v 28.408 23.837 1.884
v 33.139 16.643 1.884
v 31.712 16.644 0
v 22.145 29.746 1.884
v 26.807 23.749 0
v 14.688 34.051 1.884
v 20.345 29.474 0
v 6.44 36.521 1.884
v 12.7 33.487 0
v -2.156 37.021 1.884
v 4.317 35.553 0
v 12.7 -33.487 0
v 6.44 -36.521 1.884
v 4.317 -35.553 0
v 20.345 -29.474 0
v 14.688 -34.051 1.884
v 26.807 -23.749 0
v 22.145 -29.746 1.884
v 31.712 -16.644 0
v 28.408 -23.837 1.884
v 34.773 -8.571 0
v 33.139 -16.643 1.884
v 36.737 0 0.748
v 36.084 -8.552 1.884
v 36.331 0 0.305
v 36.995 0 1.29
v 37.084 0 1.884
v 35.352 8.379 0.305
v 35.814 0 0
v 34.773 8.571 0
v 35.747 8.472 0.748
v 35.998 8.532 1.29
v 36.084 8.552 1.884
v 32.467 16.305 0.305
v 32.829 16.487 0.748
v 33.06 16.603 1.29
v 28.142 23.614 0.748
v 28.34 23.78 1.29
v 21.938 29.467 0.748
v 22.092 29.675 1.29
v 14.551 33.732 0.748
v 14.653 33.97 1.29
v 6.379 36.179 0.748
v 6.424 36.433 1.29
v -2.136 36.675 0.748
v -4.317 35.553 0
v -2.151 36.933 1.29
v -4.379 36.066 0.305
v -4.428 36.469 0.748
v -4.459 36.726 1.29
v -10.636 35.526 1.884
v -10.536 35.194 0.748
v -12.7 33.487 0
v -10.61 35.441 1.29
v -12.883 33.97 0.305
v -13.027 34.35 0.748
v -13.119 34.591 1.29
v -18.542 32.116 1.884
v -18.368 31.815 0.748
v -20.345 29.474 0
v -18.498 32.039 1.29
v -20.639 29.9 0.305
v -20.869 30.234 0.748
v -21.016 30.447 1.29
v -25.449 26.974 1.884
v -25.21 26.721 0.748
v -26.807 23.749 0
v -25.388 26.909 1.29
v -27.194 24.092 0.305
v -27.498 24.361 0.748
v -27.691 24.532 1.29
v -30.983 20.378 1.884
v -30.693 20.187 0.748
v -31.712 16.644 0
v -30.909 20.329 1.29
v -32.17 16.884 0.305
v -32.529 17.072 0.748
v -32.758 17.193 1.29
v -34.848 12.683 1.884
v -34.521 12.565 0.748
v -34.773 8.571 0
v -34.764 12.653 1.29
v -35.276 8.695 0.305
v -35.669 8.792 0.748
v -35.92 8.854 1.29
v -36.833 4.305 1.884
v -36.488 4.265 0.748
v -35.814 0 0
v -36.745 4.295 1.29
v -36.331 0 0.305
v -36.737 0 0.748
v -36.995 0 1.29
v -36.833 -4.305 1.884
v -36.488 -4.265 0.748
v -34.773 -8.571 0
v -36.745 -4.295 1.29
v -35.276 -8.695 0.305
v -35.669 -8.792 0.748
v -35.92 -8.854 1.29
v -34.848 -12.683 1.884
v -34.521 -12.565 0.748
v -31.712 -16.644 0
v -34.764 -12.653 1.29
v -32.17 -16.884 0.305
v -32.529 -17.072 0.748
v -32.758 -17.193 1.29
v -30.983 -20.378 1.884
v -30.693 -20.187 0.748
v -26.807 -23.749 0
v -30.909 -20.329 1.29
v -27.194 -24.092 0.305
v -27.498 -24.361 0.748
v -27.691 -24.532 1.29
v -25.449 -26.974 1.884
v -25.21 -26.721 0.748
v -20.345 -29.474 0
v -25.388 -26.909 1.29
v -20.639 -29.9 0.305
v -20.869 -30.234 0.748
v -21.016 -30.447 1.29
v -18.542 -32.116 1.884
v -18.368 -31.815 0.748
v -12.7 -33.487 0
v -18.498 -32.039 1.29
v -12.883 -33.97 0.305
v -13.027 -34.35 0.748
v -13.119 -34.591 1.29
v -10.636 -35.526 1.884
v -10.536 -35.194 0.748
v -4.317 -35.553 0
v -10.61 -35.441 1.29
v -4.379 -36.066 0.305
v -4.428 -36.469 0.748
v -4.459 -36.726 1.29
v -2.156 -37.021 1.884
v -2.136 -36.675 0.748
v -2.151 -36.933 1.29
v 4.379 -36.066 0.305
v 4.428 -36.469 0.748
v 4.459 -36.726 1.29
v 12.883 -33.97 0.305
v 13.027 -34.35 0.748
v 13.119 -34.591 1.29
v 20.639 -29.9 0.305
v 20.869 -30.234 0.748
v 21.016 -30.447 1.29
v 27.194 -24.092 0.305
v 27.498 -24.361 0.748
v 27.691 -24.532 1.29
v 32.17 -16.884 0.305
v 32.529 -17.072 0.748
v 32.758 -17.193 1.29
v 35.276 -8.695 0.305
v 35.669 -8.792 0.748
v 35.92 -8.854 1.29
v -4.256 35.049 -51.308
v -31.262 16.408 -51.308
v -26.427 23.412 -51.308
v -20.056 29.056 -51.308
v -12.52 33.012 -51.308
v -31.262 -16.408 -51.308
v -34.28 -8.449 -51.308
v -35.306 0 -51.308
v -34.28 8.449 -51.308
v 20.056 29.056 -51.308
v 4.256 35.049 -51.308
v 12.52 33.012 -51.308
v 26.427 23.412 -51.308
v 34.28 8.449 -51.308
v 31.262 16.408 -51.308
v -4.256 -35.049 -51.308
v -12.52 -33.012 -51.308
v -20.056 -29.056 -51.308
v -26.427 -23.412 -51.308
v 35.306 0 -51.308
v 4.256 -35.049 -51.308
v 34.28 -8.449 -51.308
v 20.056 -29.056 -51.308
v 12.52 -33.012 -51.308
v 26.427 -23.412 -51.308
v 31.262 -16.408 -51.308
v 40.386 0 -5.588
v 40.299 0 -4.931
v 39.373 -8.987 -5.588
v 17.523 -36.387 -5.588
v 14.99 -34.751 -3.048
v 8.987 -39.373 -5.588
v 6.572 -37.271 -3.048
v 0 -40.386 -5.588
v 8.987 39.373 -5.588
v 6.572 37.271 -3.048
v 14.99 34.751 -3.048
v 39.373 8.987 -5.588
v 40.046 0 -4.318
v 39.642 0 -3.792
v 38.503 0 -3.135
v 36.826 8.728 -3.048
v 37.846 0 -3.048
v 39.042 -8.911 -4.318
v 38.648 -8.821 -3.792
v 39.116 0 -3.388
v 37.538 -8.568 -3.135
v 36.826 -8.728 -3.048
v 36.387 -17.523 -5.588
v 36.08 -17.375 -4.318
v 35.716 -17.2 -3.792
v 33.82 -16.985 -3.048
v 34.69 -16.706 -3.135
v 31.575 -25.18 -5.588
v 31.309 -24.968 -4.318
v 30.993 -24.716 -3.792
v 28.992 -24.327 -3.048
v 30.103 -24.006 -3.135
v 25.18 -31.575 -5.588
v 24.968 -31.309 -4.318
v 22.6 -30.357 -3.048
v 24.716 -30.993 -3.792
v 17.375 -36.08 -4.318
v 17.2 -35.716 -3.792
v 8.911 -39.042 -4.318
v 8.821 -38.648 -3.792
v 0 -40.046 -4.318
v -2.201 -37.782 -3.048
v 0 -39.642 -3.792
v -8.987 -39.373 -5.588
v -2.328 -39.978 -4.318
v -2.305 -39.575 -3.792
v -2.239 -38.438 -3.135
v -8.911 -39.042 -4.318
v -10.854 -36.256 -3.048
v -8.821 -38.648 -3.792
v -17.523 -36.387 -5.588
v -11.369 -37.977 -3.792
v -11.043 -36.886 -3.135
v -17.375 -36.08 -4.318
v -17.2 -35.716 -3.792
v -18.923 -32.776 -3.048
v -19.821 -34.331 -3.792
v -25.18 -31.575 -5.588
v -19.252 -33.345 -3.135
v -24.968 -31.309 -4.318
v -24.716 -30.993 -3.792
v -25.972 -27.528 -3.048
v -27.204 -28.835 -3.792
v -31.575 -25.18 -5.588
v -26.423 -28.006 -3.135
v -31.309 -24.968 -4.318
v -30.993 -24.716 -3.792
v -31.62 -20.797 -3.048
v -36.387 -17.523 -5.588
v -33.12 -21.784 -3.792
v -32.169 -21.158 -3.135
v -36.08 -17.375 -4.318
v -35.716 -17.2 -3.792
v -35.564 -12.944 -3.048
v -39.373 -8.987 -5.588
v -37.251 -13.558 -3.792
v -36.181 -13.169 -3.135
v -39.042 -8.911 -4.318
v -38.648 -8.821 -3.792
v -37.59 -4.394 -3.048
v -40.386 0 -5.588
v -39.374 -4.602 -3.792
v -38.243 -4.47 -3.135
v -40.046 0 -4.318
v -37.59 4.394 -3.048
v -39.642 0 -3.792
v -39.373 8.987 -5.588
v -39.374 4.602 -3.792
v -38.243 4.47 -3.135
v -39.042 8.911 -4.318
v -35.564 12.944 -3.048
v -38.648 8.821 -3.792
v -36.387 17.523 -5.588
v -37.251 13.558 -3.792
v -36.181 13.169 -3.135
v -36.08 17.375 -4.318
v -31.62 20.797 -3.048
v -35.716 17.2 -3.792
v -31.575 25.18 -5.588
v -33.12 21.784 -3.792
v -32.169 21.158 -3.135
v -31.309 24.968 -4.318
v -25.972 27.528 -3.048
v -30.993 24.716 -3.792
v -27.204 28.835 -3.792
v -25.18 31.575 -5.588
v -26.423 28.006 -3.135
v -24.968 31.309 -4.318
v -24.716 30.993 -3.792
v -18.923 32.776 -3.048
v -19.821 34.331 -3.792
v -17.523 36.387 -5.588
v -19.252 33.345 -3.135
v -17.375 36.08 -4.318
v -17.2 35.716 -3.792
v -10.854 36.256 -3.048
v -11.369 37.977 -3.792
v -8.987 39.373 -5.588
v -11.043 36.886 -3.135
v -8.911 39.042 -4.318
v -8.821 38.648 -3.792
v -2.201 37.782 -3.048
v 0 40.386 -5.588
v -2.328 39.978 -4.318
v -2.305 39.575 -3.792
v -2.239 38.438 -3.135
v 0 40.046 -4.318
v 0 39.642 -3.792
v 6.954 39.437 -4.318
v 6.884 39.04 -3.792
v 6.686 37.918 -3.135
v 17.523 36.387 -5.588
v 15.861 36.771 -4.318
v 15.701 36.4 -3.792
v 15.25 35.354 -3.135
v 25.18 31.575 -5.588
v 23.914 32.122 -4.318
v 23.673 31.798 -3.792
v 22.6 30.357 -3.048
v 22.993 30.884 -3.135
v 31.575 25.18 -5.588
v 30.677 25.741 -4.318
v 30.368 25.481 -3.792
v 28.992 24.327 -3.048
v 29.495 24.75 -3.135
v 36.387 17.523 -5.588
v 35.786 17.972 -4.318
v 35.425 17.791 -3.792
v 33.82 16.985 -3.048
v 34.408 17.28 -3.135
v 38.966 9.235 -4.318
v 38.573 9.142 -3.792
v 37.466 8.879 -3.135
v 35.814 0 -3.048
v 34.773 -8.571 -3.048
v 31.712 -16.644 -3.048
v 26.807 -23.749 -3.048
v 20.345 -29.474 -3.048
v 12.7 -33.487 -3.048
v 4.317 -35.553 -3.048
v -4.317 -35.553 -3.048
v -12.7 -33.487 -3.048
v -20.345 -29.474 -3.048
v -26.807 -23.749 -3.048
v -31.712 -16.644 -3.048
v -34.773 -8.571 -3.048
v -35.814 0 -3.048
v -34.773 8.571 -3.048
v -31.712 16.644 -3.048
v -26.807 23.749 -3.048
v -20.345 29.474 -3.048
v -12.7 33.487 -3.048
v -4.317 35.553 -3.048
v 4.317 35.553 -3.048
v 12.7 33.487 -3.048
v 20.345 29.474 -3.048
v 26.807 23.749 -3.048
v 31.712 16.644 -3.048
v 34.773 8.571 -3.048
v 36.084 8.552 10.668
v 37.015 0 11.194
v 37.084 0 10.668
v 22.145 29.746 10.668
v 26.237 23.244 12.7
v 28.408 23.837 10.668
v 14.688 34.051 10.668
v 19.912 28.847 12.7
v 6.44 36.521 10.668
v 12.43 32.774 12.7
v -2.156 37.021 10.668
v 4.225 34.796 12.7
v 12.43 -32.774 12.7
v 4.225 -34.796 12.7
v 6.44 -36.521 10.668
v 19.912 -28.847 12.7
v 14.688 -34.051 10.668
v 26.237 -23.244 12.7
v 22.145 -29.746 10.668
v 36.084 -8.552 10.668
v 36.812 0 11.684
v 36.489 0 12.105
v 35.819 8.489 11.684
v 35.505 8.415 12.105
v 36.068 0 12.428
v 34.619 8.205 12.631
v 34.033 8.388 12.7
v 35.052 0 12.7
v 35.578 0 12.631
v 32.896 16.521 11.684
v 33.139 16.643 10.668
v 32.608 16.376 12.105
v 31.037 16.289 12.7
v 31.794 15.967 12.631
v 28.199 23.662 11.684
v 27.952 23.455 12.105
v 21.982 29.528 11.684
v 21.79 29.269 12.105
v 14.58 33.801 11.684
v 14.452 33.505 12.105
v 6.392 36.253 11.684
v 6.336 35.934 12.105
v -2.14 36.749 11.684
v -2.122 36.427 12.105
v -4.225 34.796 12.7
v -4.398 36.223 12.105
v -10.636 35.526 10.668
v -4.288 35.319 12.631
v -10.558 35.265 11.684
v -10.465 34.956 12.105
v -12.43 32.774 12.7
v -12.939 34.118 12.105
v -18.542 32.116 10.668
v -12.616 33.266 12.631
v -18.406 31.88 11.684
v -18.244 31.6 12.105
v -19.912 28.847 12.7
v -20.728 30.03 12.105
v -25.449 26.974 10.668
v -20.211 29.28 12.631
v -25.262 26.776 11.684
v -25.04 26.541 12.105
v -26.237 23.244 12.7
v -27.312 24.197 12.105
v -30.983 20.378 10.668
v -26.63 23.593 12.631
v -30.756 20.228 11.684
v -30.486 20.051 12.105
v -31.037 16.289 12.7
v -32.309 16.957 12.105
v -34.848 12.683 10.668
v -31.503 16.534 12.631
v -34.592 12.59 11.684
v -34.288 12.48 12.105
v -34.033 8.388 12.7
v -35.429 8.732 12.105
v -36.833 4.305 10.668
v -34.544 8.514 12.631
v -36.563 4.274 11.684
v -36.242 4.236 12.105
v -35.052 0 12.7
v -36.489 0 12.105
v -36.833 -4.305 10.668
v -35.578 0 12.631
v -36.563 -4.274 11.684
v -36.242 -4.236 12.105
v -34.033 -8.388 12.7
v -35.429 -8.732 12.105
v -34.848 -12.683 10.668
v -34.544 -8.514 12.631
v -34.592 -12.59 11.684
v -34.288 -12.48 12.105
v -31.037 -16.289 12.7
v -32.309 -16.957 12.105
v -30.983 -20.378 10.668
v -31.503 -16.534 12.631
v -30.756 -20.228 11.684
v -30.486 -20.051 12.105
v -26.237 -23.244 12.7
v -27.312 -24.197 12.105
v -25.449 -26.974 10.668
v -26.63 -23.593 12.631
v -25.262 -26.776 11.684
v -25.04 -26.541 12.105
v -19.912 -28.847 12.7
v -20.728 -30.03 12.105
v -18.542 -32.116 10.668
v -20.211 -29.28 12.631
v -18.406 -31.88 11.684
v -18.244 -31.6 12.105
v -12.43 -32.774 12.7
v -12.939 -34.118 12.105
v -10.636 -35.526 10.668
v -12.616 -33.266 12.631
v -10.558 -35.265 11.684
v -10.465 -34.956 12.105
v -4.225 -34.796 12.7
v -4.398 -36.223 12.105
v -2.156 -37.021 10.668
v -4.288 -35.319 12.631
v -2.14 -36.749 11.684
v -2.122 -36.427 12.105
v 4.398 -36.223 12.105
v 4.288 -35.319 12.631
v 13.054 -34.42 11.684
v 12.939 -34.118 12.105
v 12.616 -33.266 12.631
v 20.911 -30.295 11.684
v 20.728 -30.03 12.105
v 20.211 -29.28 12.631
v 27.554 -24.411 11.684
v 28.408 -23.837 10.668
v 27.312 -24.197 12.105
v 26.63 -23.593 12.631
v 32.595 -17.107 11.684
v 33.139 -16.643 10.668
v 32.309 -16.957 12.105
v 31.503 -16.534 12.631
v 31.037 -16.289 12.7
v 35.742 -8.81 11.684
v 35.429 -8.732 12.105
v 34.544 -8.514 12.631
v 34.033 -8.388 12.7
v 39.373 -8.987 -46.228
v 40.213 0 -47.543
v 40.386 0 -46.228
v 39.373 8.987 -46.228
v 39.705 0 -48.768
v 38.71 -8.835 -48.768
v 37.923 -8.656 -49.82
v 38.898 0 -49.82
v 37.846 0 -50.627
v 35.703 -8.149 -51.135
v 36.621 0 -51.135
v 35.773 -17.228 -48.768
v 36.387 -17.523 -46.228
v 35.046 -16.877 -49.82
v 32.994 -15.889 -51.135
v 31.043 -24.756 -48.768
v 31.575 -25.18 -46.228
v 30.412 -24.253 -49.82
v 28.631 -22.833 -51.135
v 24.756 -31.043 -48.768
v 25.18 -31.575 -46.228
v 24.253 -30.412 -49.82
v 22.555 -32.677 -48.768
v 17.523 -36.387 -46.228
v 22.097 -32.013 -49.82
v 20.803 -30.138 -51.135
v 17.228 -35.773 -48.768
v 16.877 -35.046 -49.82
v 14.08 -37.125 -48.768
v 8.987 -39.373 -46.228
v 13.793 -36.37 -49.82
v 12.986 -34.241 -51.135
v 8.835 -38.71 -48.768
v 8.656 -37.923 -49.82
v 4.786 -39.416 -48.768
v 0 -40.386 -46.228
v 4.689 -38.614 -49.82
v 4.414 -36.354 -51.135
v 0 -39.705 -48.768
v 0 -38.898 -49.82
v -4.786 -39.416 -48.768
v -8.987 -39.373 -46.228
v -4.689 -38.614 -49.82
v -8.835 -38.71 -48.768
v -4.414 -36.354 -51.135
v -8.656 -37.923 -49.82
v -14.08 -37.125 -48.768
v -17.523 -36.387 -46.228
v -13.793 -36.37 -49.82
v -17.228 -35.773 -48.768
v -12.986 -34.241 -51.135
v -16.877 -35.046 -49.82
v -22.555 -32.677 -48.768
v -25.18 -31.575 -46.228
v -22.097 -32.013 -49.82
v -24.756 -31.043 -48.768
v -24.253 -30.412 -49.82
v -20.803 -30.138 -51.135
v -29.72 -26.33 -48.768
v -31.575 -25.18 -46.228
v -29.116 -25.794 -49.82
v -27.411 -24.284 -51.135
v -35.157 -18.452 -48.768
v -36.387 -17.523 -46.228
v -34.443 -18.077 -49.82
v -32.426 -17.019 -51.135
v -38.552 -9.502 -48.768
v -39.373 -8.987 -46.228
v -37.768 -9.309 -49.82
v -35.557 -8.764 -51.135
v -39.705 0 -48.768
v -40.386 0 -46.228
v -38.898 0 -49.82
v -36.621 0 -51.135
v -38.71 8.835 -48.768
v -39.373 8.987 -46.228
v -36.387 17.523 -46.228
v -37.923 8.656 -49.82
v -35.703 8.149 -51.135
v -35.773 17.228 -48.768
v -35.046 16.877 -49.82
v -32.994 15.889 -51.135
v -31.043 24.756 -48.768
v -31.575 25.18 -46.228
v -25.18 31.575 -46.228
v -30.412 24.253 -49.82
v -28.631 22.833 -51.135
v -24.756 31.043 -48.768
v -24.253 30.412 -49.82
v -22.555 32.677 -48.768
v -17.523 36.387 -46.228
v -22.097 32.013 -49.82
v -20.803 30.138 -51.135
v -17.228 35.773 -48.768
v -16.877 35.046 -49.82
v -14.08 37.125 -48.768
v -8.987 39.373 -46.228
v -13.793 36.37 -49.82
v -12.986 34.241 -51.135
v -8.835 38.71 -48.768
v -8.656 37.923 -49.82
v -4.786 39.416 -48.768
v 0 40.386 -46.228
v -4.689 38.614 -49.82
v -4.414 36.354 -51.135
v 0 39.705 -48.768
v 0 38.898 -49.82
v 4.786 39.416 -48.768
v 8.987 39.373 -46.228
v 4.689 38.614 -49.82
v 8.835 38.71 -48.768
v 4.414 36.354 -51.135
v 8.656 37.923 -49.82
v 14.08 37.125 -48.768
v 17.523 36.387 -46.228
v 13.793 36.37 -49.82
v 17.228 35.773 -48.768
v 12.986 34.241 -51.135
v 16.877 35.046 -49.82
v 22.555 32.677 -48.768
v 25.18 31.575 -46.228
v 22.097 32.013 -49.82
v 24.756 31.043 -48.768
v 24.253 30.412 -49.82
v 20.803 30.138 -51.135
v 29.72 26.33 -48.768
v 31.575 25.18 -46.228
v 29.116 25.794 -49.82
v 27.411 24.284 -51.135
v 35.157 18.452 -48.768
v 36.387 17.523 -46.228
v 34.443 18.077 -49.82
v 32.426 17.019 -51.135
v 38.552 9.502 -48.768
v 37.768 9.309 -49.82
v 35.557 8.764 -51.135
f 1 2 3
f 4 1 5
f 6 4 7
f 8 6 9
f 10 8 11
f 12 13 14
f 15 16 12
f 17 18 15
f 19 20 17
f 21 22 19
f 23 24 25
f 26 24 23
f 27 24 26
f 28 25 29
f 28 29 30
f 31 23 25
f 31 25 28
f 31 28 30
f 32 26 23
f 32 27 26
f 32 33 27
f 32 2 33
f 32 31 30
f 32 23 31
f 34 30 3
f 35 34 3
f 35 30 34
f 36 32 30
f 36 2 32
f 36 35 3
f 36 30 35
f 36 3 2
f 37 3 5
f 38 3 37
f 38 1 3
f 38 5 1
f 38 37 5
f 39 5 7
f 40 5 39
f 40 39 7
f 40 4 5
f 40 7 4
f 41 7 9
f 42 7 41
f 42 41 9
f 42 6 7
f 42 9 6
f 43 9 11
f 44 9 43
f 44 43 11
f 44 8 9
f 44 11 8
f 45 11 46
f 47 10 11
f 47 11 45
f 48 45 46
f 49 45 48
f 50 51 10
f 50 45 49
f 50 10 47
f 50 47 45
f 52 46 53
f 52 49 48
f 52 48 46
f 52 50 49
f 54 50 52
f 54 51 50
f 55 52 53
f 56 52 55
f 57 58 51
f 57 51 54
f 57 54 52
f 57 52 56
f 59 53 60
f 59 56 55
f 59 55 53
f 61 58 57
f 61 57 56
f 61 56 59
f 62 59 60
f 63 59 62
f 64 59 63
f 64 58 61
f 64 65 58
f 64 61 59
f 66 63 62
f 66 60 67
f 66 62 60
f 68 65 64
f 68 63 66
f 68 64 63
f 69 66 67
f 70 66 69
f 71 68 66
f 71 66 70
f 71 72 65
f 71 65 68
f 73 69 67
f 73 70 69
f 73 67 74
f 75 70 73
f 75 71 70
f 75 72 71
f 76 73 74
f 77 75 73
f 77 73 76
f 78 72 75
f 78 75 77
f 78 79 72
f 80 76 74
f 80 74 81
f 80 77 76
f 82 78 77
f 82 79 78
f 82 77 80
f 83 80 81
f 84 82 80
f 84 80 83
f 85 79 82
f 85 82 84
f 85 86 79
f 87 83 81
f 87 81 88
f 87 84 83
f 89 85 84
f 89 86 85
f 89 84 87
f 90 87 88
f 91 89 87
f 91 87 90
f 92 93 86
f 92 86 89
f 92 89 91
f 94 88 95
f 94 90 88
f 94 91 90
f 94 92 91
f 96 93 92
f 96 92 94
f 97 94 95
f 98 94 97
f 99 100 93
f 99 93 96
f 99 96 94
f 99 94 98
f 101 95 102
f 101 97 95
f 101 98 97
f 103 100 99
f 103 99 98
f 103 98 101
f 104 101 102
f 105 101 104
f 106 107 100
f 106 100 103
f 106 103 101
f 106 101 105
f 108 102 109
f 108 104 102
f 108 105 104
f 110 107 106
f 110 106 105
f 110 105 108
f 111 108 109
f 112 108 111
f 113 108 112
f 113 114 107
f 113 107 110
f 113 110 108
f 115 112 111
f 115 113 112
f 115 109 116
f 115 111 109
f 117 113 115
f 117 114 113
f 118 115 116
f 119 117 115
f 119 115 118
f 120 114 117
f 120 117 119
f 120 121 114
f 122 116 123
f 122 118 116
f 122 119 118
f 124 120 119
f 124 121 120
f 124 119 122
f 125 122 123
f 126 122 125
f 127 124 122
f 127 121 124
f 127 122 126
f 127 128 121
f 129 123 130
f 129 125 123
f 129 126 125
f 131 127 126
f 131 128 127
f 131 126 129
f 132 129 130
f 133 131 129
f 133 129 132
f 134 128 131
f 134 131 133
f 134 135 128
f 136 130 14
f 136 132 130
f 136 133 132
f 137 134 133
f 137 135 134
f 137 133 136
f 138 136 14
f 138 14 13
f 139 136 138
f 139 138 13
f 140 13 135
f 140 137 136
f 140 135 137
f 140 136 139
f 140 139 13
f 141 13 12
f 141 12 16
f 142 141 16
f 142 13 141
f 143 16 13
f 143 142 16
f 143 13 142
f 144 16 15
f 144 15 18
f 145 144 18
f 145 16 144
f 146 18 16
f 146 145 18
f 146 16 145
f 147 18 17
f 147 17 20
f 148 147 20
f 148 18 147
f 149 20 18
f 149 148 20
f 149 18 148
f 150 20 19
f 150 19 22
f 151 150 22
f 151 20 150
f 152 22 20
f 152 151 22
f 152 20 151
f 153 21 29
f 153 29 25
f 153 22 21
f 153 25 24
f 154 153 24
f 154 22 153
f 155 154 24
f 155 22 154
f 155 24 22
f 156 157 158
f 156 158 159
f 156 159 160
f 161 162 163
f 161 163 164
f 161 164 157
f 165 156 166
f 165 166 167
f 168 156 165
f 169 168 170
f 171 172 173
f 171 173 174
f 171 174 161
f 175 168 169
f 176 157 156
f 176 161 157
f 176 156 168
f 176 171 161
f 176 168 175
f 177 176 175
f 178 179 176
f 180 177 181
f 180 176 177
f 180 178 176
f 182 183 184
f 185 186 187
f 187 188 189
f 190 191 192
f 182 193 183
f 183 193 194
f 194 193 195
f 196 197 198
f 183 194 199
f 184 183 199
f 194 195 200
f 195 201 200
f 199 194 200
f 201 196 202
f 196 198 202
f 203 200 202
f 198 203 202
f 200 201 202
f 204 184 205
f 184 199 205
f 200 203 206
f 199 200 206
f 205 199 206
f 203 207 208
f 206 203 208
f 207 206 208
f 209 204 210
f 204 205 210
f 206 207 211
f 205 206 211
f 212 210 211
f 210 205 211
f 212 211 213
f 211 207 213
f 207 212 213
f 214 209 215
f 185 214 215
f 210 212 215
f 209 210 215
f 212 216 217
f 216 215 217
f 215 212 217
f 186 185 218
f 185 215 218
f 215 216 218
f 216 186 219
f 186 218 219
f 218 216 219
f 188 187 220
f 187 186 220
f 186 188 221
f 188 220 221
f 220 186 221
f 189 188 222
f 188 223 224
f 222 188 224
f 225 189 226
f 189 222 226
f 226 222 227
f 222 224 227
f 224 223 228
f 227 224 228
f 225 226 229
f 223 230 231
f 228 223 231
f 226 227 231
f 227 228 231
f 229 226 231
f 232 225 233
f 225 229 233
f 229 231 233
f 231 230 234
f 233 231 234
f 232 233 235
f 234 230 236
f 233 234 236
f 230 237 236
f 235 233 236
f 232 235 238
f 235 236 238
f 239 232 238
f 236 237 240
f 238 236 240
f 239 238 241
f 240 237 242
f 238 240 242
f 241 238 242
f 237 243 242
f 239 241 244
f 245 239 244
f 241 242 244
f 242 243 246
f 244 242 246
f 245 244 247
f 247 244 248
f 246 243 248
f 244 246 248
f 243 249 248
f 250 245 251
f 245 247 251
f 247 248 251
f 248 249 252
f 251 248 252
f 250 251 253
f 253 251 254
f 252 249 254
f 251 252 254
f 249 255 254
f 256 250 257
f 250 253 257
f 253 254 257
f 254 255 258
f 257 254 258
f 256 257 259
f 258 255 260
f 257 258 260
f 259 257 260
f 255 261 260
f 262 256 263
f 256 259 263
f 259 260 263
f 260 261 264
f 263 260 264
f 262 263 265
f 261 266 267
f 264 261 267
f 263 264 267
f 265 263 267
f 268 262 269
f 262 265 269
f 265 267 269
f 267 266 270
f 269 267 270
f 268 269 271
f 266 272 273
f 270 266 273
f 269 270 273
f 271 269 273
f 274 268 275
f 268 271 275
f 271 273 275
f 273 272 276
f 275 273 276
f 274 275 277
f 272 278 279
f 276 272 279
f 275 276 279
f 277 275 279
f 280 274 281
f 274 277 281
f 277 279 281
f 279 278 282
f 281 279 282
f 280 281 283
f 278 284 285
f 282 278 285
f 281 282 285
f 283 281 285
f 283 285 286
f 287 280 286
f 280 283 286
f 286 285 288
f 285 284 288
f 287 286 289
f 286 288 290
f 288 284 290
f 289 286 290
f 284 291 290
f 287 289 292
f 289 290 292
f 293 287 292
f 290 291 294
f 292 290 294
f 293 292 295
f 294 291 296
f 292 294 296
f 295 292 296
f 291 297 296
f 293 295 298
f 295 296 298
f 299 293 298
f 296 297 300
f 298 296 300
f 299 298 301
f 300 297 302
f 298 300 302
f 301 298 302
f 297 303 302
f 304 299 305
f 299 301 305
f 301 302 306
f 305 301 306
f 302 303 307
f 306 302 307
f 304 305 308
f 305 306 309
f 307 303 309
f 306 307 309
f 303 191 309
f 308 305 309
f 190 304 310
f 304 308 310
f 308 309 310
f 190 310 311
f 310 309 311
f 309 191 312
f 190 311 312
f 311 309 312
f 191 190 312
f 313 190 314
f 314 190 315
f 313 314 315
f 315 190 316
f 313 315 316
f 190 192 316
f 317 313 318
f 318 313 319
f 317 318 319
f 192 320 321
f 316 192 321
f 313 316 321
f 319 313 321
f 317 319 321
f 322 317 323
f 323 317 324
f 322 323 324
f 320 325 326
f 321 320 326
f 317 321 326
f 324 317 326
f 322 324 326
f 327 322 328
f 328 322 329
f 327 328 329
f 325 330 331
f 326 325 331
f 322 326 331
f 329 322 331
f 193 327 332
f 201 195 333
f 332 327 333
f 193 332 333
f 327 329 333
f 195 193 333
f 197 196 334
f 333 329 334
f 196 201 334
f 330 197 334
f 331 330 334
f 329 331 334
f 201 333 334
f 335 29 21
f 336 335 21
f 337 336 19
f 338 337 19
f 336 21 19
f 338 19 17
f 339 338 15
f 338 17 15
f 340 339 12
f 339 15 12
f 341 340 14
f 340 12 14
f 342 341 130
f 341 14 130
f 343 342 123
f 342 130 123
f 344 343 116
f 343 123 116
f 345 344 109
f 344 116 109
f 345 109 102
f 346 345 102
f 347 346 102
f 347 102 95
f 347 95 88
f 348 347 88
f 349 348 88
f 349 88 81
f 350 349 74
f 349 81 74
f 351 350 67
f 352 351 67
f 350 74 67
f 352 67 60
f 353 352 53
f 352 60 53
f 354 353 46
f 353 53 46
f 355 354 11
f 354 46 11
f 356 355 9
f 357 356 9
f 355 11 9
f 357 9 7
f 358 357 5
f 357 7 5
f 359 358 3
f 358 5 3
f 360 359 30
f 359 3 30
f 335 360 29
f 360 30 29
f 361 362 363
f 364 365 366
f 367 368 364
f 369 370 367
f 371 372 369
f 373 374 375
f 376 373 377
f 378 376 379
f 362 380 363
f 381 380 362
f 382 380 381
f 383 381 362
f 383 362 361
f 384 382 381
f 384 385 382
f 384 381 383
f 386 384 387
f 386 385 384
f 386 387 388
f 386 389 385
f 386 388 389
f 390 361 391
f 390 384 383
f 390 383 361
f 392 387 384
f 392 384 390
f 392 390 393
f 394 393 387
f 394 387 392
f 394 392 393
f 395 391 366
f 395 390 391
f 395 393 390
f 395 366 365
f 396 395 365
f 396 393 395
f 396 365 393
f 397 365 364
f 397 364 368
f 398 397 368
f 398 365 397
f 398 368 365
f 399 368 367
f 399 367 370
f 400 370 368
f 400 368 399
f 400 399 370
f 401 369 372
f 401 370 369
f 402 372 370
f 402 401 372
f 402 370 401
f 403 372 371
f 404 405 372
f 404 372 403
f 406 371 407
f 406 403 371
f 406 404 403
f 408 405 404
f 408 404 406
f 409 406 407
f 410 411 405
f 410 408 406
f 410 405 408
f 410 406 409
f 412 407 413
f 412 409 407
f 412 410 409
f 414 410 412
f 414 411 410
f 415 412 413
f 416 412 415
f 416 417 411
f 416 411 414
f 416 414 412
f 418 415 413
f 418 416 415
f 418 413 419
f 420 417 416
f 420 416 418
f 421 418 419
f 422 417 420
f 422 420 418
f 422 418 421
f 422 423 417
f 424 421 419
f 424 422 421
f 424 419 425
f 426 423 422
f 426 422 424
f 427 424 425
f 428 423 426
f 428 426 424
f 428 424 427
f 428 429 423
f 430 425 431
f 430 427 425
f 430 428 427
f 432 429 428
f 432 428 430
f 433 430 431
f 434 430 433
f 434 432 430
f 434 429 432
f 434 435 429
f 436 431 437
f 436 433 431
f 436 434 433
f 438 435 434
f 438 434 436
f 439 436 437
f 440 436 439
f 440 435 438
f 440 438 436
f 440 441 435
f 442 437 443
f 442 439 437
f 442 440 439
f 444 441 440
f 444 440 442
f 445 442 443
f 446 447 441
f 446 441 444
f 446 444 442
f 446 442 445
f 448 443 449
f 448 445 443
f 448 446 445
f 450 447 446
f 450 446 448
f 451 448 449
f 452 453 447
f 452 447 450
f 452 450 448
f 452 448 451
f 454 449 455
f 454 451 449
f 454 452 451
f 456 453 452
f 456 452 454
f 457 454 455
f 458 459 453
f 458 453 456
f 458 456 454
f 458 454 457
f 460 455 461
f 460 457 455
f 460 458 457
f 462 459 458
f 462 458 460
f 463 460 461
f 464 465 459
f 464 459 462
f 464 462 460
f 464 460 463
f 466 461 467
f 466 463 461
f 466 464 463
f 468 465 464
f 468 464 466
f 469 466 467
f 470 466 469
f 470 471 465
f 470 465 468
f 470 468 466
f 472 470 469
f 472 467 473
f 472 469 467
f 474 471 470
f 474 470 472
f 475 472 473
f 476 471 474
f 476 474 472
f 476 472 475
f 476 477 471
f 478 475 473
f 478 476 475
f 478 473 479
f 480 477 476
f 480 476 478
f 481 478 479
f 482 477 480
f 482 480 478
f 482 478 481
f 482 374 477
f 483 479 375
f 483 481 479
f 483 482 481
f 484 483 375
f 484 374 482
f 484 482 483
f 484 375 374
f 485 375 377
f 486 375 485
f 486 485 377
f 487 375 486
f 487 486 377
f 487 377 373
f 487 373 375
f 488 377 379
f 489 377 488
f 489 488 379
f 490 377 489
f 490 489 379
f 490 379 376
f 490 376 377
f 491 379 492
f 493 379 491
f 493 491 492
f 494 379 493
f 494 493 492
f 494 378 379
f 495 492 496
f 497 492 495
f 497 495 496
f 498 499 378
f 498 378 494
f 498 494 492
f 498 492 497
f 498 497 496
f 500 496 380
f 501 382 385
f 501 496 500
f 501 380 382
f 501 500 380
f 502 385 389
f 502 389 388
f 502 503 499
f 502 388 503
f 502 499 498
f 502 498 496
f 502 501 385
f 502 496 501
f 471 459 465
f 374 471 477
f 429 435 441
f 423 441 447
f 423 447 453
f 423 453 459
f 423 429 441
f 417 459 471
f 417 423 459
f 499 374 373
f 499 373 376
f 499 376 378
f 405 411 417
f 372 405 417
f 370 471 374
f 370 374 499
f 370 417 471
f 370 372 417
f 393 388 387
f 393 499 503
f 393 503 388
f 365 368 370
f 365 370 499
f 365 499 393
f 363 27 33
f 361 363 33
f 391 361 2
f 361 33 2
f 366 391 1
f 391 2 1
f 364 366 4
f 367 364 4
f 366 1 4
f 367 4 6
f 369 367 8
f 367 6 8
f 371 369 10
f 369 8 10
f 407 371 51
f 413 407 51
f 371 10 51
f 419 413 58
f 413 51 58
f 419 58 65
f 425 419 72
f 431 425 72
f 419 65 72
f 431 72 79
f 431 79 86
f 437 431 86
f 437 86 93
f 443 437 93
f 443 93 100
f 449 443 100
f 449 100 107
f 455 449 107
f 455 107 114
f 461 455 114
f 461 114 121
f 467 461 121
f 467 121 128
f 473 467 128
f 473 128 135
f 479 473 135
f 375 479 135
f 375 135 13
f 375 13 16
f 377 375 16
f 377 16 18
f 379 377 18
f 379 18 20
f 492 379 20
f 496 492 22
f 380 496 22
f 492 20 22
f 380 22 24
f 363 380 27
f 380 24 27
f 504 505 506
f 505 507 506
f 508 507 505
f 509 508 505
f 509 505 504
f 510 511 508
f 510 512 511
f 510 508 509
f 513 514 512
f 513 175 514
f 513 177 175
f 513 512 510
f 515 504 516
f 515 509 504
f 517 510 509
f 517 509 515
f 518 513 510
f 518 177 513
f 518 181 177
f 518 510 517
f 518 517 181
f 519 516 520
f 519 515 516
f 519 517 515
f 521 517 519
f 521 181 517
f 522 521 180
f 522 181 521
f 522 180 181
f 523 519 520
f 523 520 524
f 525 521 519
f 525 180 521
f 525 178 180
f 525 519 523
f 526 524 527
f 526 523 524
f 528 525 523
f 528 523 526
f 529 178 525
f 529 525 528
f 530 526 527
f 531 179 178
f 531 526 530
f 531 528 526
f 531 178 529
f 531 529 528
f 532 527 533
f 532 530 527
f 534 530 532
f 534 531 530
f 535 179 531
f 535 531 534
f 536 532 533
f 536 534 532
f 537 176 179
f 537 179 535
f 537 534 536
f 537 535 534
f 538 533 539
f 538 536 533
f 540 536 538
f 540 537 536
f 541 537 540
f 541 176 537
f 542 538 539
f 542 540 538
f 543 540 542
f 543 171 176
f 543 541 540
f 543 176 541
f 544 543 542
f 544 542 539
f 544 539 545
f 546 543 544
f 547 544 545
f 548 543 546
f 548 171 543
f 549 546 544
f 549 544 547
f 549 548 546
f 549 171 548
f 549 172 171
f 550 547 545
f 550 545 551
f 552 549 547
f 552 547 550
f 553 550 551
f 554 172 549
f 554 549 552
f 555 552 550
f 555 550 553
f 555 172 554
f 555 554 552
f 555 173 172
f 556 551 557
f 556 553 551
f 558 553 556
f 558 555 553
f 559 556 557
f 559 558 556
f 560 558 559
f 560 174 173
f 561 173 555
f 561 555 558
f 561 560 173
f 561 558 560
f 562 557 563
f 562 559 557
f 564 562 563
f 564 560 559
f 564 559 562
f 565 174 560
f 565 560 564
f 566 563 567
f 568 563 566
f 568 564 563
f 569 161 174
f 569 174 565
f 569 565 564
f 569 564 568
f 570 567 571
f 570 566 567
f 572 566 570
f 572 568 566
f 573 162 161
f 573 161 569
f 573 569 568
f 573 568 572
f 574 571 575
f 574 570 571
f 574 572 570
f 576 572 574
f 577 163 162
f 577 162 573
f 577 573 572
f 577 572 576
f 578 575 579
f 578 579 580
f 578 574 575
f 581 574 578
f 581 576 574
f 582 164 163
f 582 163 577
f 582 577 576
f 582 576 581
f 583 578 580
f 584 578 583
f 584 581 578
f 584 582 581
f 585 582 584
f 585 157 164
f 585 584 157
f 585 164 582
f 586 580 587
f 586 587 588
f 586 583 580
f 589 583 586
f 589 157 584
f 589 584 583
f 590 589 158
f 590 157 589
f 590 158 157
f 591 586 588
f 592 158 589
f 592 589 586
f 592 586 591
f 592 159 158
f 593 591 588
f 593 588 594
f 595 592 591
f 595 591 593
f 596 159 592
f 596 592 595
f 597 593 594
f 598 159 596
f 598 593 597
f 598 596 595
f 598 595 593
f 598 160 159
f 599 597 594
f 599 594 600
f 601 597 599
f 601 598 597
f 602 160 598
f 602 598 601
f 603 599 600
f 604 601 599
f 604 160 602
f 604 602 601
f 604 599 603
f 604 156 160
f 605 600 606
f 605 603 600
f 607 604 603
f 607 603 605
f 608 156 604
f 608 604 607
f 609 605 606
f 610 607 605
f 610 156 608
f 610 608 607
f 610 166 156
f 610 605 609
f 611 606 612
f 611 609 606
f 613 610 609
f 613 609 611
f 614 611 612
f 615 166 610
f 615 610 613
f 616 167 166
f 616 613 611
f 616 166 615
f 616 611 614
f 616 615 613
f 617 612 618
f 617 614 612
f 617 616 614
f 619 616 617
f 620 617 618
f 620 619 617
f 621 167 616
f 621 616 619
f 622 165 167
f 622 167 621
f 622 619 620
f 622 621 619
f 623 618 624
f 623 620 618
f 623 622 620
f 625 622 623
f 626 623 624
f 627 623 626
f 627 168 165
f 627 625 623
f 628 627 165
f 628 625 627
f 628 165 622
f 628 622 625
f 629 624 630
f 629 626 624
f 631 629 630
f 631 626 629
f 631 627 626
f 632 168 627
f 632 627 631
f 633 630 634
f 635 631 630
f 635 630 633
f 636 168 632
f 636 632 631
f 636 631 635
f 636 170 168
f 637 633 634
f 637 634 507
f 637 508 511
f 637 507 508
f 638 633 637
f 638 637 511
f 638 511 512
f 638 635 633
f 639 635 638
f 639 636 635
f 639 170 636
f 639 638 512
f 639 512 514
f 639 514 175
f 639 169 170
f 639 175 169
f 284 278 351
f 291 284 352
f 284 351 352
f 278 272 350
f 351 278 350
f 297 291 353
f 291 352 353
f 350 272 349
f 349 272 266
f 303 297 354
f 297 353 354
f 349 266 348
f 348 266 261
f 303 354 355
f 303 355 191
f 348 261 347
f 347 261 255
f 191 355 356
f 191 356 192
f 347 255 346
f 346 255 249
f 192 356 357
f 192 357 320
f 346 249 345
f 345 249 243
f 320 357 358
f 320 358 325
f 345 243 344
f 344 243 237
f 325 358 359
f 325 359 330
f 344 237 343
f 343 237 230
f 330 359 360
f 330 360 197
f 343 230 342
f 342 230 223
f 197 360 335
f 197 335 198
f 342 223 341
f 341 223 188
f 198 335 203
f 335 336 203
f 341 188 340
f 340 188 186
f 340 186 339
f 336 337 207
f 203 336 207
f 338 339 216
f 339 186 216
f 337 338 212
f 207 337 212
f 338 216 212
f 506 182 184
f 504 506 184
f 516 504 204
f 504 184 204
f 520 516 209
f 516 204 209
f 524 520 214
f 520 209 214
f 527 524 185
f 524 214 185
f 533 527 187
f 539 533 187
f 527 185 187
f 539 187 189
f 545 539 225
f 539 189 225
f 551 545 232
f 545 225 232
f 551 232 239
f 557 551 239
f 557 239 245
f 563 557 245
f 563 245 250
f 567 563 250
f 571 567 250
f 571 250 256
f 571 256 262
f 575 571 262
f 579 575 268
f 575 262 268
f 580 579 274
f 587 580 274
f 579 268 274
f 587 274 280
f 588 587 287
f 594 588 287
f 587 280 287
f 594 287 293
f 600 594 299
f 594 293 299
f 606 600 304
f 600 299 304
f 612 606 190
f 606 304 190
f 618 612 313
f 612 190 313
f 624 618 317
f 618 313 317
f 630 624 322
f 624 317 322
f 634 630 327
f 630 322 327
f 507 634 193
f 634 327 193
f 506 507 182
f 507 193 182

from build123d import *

# Parameters (mm, degrees)
SKETCH1_R           = 37.084
BOSS_EXTRUDE1_DEPTH = 12.7
SKETCH2_R           = 35.814
BOSS_EXTRUDE2_DEPTH = 3.048
SKETCH3_R           = 40.386
BOSS_EXTRUDE3_DEPTH = 48.26
FILLET1_R           = 2.54
FILLET2_R           = 5.08
FILLET3_R           = 2.032


with BuildPart() as part:
    # Sketch1 → Boss-Extrude1 (new body)
    with BuildSketch(Plane.XY):
        Circle(SKETCH1_R)
    extrude(amount=BOSS_EXTRUDE1_DEPTH)

    # Sketch2 → Boss-Extrude2 (add)
    with BuildSketch(Plane(origin=(0, 0, 0), x_dir=(-1, 0, 0), z_dir=(0, 0, -1))):
        with Locations(Location((0, 0, 0), (0, 0, 180))):
            Circle(SKETCH2_R)
    extrude(amount=BOSS_EXTRUDE2_DEPTH)

    # Sketch3 → Boss-Extrude3 (add)
    with BuildSketch(Plane(origin=(0, 0, -3.048), x_dir=(-1, 0, 0), z_dir=(0, 0, -1))):
        with Locations(Location((0, 0, 0), (0, 0, 180))):
            Circle(SKETCH3_R)
    extrude(amount=BOSS_EXTRUDE3_DEPTH)

    # Fillet1
    fillet1_edges = [part.edges().sort_by_distance(p)[0] for p in [
        (-40.386, 0, -3.048),
    ]]
    fillet(fillet1_edges, radius=FILLET1_R)

    # Fillet2
    fillet2_edges = [part.edges().sort_by_distance(p)[0] for p in [
        (-40.386, 0, -51.308),
    ]]
    fillet(fillet2_edges, radius=FILLET2_R)

    # Fillet3
    # the kernel refuses this fillet: 2.032 mm, written as the material it takes off along each edge
    with BuildSketch(Plane(origin=(0, 0, 0), x_dir=(1, 0, 0), z_dir=(0, -1, 0))) as fillet3_piece_1:
        with BuildLine():
            CenterArc((35.052, 1.883714416), FILLET3_R, 292.024312837, 67.975687163)
            Line((37.084, 1.883714416), (37.12464, 1.883714416))
            Line((37.12464, 1.883714416), (37.12464, 0))
            Line((37.12464, 0), (37.084, -0.04064))
            ThreePointArc((37.084, -0.04064), (36.449, -0.04064), (35.82924, -0.037674288))
            Line((35.82924, -0.037674288), (35.814, 0))
        make_face()
    revolve(axis=Axis((0, 0, 0), (0, 0, 1)), mode=Mode.SUBTRACT)
    with BuildSketch(Plane(origin=(0, 0, 12.7), x_dir=(1, 0, 0), z_dir=(0, -1, 0))) as fillet3_piece_2:
        with BuildLine():
            CenterArc((37.084 - FILLET3_R, -FILLET3_R), FILLET3_R, 0, 90)
            Line((37.084 - FILLET3_R, 0), (37.084 - FILLET3_R, FILLET3_R * 0.02))
            Line((37.084 - FILLET3_R, FILLET3_R * 0.02), (37.084 + FILLET3_R * 0.02, FILLET3_R * 0.02))
            Line((37.084 + FILLET3_R * 0.02, FILLET3_R * 0.02), (37.084 + FILLET3_R * 0.02, -FILLET3_R))
            Line((37.084 + FILLET3_R * 0.02, -FILLET3_R), (37.084, -FILLET3_R))
        make_face()
    revolve(axis=Axis((0, 0, 12.7), (0, 0, 1)), mode=Mode.SUBTRACT)


solid = part.part
